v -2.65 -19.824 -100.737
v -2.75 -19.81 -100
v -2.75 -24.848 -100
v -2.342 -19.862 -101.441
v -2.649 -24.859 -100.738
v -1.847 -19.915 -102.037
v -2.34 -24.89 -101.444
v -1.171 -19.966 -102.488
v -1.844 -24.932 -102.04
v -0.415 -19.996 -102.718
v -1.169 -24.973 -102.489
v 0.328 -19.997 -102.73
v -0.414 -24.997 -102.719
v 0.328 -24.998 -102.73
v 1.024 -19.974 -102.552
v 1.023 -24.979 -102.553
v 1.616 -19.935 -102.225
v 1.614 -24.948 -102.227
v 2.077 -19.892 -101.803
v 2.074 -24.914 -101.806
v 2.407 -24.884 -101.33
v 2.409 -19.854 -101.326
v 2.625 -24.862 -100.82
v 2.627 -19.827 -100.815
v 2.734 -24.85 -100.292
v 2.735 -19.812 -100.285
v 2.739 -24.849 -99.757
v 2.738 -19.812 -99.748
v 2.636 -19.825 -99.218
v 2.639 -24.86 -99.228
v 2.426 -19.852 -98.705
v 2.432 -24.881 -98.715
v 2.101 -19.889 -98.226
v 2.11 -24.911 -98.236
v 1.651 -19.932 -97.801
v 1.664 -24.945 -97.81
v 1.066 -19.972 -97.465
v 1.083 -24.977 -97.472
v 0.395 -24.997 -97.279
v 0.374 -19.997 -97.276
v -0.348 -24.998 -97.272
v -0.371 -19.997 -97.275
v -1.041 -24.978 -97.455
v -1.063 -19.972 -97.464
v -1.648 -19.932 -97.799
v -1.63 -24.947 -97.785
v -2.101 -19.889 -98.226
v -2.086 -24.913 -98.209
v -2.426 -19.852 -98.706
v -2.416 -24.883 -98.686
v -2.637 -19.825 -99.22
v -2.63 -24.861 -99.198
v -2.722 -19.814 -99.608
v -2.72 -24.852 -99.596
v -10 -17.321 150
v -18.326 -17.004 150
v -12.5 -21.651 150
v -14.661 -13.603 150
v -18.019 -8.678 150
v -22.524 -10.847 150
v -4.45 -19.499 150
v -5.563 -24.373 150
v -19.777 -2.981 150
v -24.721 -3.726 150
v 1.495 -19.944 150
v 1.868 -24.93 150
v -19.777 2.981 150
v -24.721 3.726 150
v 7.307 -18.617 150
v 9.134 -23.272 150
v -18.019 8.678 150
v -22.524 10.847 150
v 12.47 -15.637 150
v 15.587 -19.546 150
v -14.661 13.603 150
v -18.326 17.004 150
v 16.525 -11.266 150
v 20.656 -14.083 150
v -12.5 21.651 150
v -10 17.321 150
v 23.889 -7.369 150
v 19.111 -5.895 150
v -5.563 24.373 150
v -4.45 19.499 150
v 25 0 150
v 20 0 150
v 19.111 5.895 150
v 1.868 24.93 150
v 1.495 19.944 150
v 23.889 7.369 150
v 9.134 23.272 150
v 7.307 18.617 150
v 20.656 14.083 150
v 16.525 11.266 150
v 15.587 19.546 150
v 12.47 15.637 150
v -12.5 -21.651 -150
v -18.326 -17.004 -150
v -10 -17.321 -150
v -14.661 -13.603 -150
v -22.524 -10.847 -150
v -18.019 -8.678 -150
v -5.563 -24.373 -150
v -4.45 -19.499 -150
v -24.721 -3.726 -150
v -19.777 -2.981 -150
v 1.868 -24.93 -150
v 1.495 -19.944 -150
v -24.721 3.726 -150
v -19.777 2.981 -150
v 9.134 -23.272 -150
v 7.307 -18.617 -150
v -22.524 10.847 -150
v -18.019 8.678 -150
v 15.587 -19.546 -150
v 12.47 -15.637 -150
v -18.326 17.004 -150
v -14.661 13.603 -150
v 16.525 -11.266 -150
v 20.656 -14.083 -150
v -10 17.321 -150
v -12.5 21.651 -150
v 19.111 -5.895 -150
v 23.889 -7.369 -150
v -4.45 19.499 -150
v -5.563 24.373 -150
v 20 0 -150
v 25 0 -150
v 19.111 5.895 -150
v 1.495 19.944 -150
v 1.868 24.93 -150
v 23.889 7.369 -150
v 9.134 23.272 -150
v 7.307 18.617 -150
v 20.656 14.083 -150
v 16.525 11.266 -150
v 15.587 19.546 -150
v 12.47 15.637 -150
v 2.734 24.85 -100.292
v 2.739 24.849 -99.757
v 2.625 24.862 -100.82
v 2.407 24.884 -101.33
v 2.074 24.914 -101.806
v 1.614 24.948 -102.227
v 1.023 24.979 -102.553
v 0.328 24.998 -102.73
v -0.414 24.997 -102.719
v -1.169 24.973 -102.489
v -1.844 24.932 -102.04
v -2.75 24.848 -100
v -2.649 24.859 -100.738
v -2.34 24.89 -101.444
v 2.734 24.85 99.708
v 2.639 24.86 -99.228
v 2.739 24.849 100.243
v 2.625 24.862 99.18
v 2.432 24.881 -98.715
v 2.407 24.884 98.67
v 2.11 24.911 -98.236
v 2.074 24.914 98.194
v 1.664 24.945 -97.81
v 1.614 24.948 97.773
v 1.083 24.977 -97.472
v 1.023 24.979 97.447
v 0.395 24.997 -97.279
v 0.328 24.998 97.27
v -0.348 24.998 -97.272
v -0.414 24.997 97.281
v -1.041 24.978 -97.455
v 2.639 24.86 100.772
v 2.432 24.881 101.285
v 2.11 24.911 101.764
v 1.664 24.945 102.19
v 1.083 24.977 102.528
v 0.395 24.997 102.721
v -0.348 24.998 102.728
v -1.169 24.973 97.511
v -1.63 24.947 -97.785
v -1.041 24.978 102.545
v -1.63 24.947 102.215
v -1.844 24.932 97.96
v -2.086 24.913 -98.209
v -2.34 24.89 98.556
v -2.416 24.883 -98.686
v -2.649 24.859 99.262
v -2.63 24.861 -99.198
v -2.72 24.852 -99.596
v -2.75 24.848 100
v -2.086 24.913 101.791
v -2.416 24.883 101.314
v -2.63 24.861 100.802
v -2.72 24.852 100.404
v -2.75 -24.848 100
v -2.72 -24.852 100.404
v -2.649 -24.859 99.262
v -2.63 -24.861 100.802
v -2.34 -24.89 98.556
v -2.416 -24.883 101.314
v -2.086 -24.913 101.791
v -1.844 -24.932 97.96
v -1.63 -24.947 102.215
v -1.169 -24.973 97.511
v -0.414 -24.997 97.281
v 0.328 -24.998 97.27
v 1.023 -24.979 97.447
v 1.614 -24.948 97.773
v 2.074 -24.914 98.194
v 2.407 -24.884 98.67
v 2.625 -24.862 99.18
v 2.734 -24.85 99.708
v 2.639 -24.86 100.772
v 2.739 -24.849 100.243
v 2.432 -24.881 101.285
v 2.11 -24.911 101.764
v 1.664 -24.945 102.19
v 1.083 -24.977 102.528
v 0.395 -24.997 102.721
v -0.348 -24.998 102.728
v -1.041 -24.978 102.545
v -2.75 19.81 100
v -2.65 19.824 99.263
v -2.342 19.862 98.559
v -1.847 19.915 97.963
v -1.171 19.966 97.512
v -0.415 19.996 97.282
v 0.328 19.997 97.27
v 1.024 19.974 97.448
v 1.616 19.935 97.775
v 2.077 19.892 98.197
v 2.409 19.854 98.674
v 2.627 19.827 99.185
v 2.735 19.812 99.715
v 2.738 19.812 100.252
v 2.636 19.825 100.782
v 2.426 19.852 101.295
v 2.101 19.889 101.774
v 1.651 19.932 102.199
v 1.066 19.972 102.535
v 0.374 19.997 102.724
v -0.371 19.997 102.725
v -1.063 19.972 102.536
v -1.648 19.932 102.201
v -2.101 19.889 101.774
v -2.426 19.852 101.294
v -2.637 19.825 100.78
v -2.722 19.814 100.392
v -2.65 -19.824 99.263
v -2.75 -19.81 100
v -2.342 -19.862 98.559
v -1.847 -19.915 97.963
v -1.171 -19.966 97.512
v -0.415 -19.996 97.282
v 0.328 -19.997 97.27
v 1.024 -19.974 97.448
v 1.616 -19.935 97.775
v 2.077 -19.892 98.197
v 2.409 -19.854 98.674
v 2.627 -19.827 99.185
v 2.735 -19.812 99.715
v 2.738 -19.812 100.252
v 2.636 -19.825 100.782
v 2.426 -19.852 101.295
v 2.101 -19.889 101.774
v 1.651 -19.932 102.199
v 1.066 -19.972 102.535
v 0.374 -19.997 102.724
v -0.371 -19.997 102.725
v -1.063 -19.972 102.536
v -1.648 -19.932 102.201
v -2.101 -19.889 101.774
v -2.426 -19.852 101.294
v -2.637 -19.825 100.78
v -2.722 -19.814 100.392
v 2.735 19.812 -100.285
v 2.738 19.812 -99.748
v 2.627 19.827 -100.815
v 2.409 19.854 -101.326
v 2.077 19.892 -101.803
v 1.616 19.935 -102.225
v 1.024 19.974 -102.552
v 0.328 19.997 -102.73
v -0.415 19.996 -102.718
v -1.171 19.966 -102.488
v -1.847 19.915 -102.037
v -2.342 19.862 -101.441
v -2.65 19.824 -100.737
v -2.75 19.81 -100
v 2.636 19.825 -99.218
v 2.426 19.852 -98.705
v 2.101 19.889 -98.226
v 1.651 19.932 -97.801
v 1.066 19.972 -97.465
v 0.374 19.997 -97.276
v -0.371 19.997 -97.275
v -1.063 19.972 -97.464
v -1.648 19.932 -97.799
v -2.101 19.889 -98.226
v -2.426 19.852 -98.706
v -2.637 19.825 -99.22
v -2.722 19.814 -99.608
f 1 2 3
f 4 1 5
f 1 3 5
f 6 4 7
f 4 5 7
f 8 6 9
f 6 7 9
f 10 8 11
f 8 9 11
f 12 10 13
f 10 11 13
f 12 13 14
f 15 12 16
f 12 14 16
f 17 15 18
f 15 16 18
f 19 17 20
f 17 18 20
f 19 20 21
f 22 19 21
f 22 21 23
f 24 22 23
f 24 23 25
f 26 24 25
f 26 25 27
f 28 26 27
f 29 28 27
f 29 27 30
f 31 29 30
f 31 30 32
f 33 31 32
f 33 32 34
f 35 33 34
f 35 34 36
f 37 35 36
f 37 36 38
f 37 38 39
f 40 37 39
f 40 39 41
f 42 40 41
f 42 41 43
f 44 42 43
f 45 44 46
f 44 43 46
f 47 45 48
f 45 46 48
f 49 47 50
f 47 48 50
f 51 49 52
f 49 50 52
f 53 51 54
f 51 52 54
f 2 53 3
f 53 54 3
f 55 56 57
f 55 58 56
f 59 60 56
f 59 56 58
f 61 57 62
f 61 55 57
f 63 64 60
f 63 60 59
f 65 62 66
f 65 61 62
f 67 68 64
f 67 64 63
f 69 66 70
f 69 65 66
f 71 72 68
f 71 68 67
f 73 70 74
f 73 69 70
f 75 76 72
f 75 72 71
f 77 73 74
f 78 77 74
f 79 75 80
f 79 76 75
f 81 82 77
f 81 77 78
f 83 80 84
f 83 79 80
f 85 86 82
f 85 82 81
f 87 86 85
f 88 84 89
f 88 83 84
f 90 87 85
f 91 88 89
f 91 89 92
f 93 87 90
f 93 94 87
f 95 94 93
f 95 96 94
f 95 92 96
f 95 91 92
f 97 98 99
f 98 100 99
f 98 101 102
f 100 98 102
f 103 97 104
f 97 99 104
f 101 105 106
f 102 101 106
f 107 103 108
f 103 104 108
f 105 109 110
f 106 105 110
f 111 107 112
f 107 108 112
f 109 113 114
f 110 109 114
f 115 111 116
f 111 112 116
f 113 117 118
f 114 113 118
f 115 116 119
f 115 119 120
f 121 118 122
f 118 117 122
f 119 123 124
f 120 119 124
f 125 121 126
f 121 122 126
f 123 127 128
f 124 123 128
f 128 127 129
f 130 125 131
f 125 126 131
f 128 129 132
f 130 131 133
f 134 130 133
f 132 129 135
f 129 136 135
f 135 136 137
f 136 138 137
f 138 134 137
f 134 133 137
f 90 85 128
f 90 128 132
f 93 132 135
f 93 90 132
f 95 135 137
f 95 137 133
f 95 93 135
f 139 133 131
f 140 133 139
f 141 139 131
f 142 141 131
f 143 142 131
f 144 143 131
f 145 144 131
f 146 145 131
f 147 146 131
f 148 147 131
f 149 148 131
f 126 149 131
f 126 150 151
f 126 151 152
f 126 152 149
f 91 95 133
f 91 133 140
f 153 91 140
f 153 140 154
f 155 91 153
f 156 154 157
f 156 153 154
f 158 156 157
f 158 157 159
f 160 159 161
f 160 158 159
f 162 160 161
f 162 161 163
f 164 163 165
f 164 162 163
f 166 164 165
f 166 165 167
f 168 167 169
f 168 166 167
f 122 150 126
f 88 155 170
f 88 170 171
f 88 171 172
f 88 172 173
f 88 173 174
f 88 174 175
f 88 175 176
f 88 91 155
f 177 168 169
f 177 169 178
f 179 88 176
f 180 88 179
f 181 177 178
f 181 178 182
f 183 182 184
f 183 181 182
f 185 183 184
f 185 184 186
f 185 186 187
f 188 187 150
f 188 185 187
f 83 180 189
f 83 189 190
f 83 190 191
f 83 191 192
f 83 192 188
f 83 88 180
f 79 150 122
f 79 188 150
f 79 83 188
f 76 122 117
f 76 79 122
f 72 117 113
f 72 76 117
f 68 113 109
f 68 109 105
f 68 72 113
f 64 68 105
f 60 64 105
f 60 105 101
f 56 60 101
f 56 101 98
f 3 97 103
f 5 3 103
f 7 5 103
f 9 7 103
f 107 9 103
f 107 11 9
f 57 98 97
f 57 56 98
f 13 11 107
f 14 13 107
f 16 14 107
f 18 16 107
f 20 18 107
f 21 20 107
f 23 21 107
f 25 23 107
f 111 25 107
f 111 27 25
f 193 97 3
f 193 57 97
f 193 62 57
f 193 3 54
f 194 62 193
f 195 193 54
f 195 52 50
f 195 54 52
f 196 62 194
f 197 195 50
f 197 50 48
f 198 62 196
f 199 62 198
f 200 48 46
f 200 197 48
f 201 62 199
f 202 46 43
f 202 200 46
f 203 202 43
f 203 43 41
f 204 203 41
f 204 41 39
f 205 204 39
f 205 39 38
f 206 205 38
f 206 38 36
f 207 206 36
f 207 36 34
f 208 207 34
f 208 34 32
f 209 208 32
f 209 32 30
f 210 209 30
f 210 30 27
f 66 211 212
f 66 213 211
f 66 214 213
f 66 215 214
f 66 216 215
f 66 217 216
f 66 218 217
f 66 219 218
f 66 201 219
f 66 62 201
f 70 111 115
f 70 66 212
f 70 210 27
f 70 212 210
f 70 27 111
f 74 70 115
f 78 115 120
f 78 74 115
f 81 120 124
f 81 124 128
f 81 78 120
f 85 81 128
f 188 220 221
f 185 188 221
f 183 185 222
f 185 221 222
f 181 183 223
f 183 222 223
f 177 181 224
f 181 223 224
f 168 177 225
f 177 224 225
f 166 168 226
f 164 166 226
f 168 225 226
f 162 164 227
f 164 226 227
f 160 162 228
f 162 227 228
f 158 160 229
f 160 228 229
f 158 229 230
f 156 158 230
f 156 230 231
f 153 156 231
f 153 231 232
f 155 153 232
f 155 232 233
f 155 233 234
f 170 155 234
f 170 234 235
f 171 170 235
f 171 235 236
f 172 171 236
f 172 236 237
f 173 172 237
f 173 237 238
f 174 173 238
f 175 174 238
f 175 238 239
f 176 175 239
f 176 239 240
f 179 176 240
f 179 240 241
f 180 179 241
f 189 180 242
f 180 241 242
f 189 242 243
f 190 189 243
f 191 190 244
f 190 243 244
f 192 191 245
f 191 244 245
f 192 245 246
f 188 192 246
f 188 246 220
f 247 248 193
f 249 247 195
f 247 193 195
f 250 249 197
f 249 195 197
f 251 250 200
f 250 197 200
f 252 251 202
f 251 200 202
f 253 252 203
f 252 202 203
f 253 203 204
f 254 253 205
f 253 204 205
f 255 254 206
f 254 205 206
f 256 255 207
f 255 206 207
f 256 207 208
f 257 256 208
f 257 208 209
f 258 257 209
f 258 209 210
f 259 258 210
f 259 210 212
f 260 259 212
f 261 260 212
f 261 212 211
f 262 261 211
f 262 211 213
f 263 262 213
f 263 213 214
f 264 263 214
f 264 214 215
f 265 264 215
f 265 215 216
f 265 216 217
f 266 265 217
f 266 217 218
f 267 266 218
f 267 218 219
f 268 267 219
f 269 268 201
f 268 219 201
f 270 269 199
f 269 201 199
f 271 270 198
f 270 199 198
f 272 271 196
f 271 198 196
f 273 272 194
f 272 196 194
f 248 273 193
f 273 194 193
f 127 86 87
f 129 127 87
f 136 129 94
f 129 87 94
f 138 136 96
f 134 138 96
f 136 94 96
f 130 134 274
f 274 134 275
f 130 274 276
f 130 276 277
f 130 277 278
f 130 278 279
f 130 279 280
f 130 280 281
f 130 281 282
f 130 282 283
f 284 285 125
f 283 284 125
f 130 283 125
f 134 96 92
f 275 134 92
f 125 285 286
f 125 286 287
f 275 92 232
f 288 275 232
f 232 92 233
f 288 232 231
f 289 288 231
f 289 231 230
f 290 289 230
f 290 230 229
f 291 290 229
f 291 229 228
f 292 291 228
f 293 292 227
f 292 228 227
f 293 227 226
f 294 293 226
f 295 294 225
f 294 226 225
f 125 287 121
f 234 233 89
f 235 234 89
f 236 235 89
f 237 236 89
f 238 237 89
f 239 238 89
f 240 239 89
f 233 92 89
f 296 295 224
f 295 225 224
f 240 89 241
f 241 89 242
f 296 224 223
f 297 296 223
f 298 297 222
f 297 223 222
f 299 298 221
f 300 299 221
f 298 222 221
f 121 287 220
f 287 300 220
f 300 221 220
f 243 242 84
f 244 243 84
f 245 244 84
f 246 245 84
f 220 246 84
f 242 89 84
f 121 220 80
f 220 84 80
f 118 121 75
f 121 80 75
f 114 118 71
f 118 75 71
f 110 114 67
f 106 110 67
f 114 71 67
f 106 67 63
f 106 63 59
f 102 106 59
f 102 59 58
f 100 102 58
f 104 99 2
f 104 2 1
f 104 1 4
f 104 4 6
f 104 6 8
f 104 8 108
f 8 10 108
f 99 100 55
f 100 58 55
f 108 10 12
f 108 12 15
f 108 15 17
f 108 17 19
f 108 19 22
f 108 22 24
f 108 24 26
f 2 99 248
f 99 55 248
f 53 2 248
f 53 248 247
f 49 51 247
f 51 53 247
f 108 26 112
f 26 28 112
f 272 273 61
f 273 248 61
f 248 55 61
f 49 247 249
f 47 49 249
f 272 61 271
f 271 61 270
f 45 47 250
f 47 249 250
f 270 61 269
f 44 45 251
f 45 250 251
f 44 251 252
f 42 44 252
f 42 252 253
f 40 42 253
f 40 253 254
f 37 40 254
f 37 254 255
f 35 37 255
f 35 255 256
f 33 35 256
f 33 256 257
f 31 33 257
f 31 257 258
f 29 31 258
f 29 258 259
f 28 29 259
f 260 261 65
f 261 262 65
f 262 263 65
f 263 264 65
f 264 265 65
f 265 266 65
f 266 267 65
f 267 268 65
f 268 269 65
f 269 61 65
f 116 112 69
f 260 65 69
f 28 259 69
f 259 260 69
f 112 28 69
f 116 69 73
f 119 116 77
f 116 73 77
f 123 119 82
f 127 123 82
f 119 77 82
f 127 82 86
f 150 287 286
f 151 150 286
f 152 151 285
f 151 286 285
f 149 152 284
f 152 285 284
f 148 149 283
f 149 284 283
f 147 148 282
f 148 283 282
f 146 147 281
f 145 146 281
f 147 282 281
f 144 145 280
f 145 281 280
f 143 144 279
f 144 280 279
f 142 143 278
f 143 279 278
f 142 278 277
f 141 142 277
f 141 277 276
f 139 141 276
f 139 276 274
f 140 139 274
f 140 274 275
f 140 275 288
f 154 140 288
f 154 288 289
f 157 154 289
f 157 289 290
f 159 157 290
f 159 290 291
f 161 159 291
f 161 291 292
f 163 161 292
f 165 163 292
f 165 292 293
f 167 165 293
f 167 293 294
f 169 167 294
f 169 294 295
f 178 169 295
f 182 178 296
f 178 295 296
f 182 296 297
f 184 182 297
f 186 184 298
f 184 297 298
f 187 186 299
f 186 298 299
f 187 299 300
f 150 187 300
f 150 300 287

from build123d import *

# Parameters (mm, degrees)
F0_R     = 25
F1_DEPTH = 150
F2_T     = -5
F5_D     = 5.5


with BuildPart() as f1:
    # F0 (on Top) → F1 (new body, symmetric)
    with BuildSketch(Plane.XY):
        Circle(F0_R)
    extrude(amount=F1_DEPTH, both=True)

    # F2
    f2_openings = [f1.faces().sort_by_distance(p)[0] for p in [
        (0, 0, 150),
        (0, 0, -150),
    ]]
    offset(amount=F2_T, openings=f2_openings)

    # F5 (through all)
    with Locations(Plane(origin=(0, 50, 0), x_dir=(1, 0, 0), z_dir=(0, 1, 0))):
        with Locations((0, 100), (0, -100)):
            Hole(F5_D / 2)


solid = f1.part
